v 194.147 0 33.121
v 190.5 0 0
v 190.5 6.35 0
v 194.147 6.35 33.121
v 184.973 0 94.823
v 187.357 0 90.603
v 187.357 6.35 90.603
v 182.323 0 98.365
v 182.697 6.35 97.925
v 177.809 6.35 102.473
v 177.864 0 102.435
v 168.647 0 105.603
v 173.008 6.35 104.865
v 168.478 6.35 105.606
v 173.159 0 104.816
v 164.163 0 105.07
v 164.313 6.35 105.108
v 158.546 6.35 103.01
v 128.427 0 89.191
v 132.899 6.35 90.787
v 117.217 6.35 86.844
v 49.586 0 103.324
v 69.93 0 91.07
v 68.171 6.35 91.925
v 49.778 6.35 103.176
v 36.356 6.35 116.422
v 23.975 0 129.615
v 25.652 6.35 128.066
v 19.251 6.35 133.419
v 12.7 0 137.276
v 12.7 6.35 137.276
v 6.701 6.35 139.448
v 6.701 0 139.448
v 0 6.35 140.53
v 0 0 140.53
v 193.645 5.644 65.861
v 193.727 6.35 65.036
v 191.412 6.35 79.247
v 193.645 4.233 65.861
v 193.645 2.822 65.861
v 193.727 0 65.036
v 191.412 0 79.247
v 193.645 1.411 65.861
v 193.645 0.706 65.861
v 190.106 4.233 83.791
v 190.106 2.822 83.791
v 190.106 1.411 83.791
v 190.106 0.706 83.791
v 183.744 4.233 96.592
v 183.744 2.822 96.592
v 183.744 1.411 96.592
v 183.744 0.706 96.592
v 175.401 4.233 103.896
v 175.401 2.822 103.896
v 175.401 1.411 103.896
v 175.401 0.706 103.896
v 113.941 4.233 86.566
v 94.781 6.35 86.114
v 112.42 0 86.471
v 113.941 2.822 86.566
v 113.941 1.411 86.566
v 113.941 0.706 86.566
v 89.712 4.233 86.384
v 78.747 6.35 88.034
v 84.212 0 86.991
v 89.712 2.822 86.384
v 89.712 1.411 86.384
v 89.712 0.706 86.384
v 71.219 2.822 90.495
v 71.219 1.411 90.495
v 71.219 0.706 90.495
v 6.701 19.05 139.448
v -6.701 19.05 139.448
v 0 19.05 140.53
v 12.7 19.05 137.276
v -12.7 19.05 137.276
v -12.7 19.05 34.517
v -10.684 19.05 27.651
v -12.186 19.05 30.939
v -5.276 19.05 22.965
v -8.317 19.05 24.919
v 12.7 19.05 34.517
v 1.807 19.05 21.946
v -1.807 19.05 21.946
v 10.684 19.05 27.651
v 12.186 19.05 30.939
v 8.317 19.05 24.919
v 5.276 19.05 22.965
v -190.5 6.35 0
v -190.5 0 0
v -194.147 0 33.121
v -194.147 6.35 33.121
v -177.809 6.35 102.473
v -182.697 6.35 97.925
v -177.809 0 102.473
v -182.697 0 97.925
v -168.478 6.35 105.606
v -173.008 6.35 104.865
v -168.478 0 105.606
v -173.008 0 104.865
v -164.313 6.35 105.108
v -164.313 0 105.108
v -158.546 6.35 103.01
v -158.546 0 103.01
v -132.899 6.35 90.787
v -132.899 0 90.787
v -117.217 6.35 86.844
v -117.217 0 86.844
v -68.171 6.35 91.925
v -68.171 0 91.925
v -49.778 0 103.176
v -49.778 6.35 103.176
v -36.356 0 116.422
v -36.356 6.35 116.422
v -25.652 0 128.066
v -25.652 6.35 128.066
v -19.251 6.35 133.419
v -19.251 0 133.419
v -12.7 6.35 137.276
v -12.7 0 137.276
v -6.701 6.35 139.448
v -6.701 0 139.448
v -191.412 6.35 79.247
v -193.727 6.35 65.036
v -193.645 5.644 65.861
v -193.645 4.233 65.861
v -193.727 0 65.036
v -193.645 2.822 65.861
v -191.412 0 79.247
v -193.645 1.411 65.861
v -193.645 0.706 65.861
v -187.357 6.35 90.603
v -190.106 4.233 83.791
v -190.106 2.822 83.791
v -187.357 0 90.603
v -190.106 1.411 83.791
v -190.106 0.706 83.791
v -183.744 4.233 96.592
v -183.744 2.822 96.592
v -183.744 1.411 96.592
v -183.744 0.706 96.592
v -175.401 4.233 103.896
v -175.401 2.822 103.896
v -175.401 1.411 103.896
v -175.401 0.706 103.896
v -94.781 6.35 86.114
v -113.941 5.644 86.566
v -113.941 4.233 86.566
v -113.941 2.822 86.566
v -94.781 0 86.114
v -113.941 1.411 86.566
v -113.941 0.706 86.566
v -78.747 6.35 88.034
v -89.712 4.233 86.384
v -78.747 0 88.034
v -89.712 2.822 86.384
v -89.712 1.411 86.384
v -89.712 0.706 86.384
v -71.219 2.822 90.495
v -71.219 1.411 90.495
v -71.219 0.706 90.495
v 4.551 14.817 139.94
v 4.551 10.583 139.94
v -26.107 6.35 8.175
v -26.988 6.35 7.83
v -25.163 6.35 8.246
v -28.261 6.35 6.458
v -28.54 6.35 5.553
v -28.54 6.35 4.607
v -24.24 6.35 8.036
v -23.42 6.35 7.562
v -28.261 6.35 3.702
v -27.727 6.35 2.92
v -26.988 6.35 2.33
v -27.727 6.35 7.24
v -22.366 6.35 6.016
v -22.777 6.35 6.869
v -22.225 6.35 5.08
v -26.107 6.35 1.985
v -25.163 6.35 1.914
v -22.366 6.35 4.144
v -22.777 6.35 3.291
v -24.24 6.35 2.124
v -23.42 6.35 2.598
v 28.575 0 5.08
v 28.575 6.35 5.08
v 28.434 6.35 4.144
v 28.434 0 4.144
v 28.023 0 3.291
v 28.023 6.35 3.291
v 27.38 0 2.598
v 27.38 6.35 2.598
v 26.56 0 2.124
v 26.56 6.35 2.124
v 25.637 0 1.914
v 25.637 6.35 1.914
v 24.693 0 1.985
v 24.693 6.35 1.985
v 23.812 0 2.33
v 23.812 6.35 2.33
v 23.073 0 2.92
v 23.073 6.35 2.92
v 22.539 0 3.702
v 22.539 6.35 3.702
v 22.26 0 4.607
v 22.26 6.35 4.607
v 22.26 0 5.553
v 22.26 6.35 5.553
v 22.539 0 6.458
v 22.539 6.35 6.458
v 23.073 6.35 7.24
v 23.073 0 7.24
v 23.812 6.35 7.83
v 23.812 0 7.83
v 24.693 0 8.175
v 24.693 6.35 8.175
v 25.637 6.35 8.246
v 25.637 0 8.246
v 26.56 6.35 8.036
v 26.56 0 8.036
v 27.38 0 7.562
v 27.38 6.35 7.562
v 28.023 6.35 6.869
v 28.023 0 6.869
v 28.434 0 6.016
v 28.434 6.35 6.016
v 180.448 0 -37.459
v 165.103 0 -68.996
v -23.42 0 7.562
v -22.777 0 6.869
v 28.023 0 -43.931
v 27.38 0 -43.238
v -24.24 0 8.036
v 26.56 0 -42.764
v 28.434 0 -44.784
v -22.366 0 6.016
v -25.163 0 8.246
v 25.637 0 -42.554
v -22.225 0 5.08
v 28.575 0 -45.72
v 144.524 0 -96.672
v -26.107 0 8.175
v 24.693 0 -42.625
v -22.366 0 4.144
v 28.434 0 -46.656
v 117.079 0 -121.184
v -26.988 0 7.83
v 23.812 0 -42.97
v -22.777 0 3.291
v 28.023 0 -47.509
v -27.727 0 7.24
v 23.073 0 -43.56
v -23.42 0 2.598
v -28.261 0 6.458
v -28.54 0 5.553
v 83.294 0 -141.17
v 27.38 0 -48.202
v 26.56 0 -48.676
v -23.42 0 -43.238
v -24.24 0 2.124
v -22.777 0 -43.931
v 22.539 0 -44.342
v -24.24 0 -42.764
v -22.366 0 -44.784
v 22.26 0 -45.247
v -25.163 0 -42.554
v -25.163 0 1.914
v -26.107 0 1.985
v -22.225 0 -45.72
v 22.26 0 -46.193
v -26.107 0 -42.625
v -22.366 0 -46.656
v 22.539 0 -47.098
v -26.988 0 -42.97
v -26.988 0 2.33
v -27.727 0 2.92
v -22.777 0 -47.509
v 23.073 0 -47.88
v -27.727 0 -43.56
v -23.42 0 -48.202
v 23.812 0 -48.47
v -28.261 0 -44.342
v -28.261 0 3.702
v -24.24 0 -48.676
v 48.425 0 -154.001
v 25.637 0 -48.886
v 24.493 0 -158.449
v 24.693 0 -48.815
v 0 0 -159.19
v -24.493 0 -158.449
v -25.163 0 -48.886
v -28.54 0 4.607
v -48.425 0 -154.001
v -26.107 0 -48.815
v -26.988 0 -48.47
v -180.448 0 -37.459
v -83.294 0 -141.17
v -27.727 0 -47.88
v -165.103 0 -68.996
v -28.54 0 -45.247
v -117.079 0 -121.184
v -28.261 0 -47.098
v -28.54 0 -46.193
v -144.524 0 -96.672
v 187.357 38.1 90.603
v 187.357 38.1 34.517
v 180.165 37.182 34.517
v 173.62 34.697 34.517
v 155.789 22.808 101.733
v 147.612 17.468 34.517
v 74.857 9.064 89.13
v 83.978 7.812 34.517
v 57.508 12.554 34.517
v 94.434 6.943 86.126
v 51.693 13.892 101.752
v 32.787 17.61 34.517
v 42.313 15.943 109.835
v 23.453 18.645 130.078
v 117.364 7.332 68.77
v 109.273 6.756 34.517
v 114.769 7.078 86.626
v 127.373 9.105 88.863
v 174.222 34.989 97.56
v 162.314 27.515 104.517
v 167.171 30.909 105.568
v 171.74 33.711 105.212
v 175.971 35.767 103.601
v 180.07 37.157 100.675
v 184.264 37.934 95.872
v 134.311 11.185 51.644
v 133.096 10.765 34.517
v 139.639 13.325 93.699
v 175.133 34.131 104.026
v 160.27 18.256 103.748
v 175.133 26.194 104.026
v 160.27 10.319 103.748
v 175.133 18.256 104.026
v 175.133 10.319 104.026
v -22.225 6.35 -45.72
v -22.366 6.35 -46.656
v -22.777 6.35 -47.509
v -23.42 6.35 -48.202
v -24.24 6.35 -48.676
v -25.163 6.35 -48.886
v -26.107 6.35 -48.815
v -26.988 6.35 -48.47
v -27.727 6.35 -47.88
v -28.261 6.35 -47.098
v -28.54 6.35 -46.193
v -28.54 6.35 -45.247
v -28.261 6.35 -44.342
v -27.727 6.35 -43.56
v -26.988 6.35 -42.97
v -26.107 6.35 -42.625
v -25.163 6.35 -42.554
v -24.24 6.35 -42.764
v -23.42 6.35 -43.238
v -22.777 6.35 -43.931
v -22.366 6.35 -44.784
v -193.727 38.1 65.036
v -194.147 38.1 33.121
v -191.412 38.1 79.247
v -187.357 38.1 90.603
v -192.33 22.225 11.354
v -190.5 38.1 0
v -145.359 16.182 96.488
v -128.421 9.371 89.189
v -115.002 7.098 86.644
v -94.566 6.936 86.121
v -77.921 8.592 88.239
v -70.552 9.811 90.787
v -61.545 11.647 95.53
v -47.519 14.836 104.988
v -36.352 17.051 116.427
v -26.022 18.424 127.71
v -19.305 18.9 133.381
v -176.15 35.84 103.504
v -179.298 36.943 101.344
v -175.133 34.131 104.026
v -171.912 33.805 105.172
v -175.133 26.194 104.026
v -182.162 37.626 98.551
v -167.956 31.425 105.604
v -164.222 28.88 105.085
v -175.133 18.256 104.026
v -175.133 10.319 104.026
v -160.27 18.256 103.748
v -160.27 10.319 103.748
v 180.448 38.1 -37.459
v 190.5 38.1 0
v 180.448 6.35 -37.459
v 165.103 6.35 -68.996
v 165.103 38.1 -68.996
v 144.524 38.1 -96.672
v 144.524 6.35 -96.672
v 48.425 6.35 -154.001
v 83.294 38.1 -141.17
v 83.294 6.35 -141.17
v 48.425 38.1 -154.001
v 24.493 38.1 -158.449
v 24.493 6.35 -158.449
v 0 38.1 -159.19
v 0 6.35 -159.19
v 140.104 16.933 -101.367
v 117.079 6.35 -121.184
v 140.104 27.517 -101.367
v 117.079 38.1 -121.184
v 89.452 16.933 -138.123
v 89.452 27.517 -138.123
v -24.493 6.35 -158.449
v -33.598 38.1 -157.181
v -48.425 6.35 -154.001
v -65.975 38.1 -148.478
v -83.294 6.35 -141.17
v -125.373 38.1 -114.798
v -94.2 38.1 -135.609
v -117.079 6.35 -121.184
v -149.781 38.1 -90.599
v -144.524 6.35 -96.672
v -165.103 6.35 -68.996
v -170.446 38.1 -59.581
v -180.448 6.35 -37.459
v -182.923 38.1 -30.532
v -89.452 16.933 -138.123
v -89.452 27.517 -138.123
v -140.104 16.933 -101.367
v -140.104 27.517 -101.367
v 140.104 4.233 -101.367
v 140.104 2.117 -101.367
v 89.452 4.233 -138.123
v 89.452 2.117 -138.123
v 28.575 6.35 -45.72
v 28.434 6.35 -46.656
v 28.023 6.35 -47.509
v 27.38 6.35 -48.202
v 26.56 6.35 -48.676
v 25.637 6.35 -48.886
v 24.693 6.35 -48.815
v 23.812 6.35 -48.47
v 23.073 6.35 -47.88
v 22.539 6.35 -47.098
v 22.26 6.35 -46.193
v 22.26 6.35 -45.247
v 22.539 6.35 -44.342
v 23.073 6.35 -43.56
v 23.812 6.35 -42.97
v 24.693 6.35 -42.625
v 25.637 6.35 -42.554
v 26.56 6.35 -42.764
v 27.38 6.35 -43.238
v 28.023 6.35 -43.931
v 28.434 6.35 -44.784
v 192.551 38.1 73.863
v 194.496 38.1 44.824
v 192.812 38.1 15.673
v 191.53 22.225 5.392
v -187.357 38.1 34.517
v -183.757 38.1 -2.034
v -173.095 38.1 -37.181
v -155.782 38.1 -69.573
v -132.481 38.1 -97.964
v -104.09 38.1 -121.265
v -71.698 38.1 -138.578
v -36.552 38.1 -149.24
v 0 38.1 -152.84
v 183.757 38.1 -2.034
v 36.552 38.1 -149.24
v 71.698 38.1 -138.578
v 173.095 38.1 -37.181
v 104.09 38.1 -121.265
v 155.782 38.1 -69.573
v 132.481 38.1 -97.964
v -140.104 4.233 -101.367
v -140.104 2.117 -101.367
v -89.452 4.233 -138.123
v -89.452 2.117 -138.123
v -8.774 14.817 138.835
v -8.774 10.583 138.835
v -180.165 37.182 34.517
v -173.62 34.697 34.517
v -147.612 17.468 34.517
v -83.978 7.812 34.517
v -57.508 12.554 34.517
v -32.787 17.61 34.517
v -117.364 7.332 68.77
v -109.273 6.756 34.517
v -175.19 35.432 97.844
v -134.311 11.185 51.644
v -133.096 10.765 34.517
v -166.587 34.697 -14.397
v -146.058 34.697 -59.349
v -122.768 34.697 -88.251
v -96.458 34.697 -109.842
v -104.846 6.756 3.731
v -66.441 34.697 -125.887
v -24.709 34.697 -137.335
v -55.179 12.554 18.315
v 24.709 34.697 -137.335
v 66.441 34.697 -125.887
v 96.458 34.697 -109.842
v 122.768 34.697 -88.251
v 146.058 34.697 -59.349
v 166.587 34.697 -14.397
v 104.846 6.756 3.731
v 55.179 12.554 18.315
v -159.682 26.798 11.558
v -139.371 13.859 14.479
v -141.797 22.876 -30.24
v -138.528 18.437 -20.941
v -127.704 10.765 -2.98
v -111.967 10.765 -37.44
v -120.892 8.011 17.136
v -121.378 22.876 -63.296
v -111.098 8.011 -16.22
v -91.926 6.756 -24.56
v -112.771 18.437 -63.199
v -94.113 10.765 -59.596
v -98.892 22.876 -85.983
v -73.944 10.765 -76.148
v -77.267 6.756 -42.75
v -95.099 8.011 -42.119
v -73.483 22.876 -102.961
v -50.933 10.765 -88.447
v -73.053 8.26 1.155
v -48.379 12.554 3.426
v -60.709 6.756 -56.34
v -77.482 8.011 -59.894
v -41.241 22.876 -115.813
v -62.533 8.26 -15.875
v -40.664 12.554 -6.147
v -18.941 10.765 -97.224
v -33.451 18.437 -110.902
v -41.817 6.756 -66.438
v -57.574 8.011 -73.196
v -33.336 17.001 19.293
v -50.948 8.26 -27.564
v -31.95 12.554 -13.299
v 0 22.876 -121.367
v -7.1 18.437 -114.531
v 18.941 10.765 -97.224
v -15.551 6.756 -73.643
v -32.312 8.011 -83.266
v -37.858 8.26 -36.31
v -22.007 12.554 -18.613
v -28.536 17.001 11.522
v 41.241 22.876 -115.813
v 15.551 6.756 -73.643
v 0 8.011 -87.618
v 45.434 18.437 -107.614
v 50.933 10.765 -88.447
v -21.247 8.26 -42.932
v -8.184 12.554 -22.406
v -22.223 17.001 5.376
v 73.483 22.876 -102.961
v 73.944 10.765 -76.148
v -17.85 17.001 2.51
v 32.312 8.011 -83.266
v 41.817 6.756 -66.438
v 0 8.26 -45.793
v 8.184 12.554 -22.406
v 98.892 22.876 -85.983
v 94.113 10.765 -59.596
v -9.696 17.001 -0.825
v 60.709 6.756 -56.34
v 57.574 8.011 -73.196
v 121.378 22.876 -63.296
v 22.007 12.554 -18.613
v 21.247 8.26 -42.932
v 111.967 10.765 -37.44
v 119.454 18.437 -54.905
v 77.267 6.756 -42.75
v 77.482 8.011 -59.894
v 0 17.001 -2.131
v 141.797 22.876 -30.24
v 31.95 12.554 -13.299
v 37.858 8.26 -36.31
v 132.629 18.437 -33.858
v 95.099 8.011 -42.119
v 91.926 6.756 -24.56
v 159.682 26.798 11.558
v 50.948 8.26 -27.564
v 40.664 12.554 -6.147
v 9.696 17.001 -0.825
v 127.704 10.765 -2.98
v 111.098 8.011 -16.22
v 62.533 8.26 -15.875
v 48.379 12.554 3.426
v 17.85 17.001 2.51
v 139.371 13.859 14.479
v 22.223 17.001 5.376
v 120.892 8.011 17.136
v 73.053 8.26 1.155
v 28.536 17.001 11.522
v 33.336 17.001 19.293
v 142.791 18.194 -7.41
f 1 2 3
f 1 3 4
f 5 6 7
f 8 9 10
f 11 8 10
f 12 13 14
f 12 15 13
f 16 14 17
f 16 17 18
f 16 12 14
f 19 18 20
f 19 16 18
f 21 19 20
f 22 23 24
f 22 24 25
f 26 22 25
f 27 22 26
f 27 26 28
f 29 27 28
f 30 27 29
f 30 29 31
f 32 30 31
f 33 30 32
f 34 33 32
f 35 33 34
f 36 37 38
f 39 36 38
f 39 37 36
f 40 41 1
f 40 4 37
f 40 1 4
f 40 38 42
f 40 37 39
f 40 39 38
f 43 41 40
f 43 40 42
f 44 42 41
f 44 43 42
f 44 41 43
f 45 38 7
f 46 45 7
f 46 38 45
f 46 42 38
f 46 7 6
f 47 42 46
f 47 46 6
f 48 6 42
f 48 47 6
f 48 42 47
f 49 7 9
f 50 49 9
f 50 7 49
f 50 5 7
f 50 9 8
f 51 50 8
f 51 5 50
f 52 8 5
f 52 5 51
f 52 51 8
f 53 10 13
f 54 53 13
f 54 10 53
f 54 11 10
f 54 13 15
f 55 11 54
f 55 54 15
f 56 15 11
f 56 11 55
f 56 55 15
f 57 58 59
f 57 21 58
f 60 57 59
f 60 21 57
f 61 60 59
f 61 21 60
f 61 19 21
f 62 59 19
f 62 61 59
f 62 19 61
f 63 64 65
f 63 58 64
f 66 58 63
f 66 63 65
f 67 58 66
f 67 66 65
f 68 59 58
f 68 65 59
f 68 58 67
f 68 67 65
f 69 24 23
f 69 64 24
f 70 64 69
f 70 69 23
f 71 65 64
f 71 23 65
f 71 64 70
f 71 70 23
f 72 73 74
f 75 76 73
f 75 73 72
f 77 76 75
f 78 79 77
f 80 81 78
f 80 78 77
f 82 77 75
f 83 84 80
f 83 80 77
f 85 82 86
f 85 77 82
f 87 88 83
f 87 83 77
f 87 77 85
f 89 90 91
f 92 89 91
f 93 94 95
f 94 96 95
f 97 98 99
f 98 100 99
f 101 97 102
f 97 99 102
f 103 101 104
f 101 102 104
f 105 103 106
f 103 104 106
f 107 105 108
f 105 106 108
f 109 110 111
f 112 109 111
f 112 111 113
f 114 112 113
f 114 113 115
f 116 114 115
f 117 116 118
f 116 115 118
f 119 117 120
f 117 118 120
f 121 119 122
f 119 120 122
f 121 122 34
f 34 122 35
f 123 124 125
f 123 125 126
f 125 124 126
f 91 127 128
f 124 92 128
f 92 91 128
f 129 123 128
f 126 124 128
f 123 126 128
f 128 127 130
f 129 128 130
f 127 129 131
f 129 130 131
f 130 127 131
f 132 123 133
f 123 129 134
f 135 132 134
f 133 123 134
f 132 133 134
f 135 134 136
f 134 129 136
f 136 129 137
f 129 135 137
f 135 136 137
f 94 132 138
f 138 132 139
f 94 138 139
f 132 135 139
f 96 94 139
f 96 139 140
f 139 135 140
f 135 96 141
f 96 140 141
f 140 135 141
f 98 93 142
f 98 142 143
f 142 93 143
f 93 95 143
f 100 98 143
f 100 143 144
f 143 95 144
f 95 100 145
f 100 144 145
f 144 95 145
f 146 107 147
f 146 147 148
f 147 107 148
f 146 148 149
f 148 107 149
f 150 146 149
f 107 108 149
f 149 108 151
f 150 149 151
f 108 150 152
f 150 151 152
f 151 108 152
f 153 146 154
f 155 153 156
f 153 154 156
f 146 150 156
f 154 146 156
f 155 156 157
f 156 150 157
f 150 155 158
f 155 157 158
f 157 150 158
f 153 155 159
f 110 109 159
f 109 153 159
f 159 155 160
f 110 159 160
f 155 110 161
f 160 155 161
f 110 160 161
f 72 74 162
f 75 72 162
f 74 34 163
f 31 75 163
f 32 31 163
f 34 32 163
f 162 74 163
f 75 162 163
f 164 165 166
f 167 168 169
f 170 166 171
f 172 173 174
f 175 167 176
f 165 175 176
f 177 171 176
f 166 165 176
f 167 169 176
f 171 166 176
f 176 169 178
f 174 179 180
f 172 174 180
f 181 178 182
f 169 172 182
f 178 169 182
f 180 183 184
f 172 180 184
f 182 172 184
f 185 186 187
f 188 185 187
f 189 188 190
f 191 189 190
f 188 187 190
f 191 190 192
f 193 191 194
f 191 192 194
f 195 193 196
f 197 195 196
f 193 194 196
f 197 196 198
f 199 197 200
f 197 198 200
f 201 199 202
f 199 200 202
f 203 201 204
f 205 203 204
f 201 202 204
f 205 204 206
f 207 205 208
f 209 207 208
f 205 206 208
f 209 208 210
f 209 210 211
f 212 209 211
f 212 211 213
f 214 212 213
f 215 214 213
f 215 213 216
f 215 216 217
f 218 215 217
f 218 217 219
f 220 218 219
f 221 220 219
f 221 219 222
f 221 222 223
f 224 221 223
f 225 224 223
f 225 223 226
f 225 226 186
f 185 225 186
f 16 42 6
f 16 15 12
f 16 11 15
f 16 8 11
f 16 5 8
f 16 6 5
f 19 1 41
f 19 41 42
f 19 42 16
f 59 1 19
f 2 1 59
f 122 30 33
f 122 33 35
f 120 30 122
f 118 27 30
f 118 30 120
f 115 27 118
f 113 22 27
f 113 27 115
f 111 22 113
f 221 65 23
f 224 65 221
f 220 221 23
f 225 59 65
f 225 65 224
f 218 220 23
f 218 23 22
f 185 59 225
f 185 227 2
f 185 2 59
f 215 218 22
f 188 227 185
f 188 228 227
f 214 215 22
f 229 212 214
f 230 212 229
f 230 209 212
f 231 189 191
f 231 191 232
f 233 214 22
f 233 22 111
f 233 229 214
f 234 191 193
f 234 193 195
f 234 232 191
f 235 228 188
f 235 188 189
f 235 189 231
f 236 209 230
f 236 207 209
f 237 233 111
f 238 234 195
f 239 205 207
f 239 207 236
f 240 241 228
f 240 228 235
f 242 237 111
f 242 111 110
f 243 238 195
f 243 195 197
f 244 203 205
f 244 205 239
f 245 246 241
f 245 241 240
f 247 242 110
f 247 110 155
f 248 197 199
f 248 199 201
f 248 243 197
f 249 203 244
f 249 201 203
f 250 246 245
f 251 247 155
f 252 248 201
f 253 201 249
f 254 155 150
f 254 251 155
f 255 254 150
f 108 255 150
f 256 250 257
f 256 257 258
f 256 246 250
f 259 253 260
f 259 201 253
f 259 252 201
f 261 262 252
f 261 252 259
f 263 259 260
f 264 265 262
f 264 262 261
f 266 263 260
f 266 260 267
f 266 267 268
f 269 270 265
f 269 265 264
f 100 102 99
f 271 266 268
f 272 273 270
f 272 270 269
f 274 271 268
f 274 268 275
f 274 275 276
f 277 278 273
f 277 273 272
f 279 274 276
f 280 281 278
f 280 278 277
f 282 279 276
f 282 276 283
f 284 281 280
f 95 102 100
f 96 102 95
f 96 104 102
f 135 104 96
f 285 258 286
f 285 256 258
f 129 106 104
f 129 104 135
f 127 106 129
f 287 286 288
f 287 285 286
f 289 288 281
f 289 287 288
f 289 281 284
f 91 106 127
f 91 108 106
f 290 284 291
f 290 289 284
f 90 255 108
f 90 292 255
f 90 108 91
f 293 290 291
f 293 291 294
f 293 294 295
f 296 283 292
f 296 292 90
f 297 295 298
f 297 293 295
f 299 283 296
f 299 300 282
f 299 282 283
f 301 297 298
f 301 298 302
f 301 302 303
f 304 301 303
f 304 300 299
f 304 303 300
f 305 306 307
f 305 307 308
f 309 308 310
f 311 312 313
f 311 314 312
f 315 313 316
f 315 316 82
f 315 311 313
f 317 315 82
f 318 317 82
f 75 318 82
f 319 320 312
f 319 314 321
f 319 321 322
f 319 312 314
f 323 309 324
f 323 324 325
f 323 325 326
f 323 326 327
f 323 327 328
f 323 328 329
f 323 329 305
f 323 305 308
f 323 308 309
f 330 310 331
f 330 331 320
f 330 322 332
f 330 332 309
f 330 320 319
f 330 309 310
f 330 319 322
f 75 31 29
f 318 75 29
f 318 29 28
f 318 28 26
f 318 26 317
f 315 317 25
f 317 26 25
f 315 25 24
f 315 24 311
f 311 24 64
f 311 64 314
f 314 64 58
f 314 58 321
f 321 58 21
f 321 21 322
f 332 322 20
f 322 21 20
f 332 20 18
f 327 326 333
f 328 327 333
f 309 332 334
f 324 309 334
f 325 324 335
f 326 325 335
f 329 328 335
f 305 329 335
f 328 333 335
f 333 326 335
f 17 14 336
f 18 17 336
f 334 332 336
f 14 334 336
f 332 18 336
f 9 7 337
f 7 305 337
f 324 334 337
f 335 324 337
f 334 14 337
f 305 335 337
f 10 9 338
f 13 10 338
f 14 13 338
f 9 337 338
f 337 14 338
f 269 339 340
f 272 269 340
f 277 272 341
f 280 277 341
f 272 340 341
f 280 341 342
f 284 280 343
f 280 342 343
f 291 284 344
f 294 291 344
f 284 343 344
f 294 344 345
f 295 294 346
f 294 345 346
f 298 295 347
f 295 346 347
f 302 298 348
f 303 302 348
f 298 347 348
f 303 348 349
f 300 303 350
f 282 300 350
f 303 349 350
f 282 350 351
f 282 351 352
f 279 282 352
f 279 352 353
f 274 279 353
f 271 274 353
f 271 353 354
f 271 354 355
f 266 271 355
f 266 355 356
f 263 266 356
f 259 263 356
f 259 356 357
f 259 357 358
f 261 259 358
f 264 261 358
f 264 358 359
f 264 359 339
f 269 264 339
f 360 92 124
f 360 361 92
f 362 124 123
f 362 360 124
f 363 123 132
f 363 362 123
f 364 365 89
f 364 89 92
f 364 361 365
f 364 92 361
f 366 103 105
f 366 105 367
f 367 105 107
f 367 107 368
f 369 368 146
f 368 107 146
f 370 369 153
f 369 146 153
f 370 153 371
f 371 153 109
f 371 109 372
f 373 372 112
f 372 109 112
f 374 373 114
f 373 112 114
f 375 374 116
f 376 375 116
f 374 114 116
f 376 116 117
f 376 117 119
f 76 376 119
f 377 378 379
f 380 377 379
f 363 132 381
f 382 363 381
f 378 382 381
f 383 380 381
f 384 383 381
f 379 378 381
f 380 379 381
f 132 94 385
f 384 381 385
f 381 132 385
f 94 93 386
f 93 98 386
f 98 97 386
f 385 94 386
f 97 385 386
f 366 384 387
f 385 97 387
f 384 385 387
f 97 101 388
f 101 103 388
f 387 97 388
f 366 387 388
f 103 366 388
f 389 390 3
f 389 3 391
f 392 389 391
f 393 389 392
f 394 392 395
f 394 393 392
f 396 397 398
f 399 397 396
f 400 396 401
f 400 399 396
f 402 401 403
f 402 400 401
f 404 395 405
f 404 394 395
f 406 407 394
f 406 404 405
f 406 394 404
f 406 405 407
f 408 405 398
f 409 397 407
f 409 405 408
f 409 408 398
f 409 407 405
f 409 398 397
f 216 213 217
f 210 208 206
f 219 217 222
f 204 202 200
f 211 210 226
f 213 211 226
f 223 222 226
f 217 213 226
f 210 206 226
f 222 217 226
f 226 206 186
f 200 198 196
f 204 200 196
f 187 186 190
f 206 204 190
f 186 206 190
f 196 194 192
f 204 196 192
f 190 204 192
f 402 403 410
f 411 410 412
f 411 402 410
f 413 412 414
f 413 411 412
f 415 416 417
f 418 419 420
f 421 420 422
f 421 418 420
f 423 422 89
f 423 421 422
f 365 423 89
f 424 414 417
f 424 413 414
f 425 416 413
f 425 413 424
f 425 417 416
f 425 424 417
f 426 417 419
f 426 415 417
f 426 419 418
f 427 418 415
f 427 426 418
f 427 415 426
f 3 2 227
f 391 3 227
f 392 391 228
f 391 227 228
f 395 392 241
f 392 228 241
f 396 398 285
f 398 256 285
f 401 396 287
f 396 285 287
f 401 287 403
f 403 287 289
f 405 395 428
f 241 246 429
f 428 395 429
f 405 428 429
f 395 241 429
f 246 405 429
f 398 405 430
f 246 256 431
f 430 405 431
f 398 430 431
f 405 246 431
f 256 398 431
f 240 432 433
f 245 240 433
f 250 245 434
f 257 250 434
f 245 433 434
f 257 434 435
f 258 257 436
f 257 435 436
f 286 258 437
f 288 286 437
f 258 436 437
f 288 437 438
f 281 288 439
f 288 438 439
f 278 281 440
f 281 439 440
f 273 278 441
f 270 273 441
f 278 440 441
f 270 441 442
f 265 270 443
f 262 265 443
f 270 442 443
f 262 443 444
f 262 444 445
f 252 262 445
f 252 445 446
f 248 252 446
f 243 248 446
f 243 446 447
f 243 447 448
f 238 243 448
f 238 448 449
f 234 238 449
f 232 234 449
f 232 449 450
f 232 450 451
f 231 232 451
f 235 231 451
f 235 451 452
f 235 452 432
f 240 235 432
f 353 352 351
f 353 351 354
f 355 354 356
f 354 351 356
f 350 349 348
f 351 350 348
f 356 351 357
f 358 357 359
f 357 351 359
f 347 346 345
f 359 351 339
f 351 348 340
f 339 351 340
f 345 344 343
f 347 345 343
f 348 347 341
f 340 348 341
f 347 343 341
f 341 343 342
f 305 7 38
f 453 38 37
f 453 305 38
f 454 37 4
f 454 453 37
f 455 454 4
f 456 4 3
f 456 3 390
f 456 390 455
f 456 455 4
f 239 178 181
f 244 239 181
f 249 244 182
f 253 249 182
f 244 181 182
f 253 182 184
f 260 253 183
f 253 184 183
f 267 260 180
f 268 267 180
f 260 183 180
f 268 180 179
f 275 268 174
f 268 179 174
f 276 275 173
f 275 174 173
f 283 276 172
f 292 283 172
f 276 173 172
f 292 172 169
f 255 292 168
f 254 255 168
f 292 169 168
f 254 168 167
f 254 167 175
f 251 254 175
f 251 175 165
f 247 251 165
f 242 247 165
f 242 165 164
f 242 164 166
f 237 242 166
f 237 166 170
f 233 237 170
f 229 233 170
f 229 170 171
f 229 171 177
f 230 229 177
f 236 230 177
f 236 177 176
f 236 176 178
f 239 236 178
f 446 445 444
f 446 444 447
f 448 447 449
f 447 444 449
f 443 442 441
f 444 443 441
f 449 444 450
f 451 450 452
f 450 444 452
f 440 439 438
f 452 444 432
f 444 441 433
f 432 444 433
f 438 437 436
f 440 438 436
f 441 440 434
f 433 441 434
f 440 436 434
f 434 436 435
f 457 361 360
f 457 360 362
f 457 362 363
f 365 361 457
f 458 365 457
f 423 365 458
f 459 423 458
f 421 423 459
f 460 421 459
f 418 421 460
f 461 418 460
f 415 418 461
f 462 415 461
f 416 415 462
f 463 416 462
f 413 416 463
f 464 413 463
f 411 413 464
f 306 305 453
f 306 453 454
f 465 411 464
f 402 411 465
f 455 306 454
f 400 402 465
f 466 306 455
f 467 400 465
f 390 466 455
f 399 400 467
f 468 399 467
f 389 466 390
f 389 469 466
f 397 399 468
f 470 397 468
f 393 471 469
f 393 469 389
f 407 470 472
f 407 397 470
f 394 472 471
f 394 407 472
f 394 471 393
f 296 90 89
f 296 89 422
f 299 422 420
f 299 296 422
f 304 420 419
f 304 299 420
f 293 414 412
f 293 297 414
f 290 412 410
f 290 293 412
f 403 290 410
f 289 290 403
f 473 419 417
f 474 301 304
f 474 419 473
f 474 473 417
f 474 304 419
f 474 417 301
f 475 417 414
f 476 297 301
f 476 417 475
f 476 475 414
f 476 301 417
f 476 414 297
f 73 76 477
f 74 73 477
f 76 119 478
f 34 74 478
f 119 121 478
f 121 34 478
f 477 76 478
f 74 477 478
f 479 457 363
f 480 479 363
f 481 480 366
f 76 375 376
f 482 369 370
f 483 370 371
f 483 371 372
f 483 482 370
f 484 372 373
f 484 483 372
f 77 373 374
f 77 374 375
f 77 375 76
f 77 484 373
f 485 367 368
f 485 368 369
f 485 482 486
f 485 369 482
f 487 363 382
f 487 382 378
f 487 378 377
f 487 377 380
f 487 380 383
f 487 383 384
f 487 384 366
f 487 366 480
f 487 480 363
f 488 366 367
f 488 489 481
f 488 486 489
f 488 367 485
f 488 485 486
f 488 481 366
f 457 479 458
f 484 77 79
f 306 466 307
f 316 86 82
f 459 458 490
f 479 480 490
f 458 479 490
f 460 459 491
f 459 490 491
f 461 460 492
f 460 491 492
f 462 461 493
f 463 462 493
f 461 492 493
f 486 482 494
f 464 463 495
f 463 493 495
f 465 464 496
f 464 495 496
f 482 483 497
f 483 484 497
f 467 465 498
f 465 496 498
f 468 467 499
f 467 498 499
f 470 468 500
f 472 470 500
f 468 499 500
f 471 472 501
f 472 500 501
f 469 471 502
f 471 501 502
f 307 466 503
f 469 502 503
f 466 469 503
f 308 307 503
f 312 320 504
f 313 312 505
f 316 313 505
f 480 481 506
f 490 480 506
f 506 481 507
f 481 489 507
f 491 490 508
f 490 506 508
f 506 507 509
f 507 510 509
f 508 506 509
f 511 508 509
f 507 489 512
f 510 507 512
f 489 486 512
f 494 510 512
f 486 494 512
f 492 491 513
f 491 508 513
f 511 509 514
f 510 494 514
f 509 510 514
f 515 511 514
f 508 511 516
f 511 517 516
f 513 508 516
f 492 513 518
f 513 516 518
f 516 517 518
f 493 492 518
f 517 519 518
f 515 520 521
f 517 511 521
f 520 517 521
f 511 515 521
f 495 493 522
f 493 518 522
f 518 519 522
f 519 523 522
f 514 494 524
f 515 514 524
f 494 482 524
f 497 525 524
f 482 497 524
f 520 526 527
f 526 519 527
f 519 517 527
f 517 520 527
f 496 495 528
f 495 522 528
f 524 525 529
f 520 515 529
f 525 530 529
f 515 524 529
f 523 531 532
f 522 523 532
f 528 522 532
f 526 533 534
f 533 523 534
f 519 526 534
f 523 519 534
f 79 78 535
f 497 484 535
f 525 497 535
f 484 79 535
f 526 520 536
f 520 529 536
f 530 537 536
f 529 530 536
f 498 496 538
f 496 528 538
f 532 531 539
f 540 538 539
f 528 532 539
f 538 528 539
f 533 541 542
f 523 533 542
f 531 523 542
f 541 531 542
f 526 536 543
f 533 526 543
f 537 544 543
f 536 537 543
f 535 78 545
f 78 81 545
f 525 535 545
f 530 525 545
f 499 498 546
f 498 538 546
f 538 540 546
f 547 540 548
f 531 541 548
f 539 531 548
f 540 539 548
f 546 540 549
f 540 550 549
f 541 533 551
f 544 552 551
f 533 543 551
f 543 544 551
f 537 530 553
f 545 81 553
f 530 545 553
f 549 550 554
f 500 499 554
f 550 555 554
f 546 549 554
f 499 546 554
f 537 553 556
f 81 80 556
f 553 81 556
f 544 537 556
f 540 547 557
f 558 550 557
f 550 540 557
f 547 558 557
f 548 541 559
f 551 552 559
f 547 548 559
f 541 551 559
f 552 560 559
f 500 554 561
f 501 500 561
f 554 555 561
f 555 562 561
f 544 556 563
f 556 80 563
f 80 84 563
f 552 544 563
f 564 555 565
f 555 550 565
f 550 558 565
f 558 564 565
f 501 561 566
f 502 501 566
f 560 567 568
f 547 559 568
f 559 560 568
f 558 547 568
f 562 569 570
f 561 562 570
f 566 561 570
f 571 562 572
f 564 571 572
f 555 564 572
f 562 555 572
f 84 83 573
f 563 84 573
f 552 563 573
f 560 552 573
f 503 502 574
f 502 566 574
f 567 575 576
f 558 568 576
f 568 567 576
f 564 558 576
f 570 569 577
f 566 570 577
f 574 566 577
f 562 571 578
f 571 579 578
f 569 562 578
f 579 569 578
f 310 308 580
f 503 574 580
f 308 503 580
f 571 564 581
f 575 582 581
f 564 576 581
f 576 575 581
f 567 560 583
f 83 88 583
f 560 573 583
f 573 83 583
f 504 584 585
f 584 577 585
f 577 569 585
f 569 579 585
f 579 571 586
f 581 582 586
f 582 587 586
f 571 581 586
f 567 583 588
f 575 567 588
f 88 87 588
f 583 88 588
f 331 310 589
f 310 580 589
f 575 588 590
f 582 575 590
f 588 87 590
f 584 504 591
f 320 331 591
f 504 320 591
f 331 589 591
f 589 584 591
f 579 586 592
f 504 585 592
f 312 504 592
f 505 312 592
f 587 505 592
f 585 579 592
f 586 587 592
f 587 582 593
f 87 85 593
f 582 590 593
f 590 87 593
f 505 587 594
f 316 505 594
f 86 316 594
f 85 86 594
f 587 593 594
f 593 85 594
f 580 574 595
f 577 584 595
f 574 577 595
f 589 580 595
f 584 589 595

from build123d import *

# Parameters (mm, degrees)
BOSS_EXTRUDE1_DEPTH         = 6.35
F_1_4_0_25_DIAMETER_HOLE1_D = 6.35
CUT_EXTRUDE3_DEPTH          = 257.844790723
BOSS_EXTRUDE2_START         = 31.75
BOSS_EXTRUDE2_DEPTH         = 31.75
BOSS_EXTRUDE3_DEPTH         = 12.7


with BuildPart() as part:
    # Sketch3 → Boss-Extrude1 (new body)
    with BuildSketch(Plane(origin=(0, 0, 0), x_dir=(1, 0, 0), z_dir=(0, 1, 0))):
        with BuildLine():
            add(Edge.make_bspline(
                [(-190.5, 0), (-184.392726562, 37.537038237), (-157.261289847, 93.964093485), (-82.387478202, 146.622658841), (-31.311374143, 160.799884185), (0, 159.189909928)],
                knots=[0, 0, 0, 0, 0.424401366, 0.656369581, 1, 1, 1, 1], degree=3))
            add(Edge.make_bspline(
                [(190.5, 0), (184.392726562, 37.537038237), (157.261289847, 93.964093485), (82.387478202, 146.622658841), (31.311374143, 160.799884185), (0, 159.189909928)],
                knots=[0, 0, 0, 0, 0.424401366, 0.656369581, 1, 1, 1, 1], degree=3))
            add(Edge.make_bspline(
                [(190.5, 0), (192.064011793, -4.963501926), (201.967167766, -83.314618311), (174.696602041, -109.289958804), (151.630121659, -100.567984898), (131.410771519, -87.719783961), (96.843567628, -85.375403377), (78.692510144, -86.25882742), (58.833533072, -96.87938247), (37.30593461, -109.935798162), (21.349613946, -139.114767457), (0, -140.530090072)],
                knots=[0, 0, 0, 0, 0.166997052, 0.292320514, 0.319633117, 0.42673531, 0.45891405, 0.609241775, 0.641909704, 0.76680237, 1, 1, 1, 1], degree=3))
            add(Edge.make_bspline(
                [(-190.5, 0), (-192.064011793, -4.963501926), (-201.967167766, -83.314618311), (-174.696602041, -109.289958804), (-151.630121659, -100.567984898), (-131.410771519, -87.719783961), (-96.843567628, -85.375403377), (-78.692510144, -86.25882742), (-58.833533072, -96.87938247), (-37.30593461, -109.935798162), (-21.349613946, -139.114767457), (0, -140.530090072)],
                knots=[0, 0, 0, 0, 0.166997052, 0.292320514, 0.319633117, 0.42673531, 0.45891405, 0.609241775, 0.641909704, 0.76680237, 1, 1, 1, 1], degree=3))
        make_face()
    extrude(amount=BOSS_EXTRUDE1_DEPTH)

    # 1/4 (0.25) Diameter Hole1 (through all)
    with Locations(Plane(origin=(0, 0, 0), x_dir=(-1, 0, 0), z_dir=(0, -1, 0))):
        with Locations((-25.4, 45.72), (25.4, 45.72), (25.4, -5.08), (-25.4, -5.08)):
            Hole(F_1_4_0_25_DIAMETER_HOLE1_D / 2)

    # Sweep3: sweep along a path in Sketch9
    with BuildLine(Plane(origin=(0, 6.35, 0), x_dir=(1, 0, 0), z_dir=(0, 1, 0))) as sweep3_path:
        Line((-187.357021454, -163.355137278), (-187.357021454, -34.517111526))
        ThreePointArc((-187.357021454, -34.517111526), (0, 152.839909928), (187.357021454, -34.517111526))
        Line((187.357021454, -34.517111526), (187.357021454, -159.794446851))
    # Sketch14 → Sweep3 (sweep)
    with BuildSketch(Plane.XY.offset(159.794446851)):
        with BuildLine():
            Line((187.357021454, 6.35), (187.357021454, 38.1))
            add(Edge.make_bspline(
                [(12.7, 19.05), (43.942, 19.05), (62.692965612, 6.892995609), (152.966881442, 6.044529769), (164.497021454, 38.1), (187.357021454, 38.1)],
                knots=[0, 0, 0, 0, 0.419037708, 0.519037708, 1, 1, 1, 1], degree=3))
            Line((12.7, 19.05), (12.7, 6.35))
            Line((12.7, 6.35), (187.357021454, 6.35))
        make_face()
    sweep(path=sweep3_path.line)

    # Sketch16 → Cut-Extrude3 (cut, through all)
    with BuildSketch(Plane.XZ):
        with BuildLine():
            Line((-187.357021454, 163.355137278), (-187.357021454, 90.603010601))
            add(Edge.make_bspline(
                [(-187.357021454, 90.603010601), (-182.022531897, 101.456727274), (-171.744921629, 108.173859638), (-151.630121659, 100.567984898), (-131.410771519, 87.719783961), (-96.843567628, 85.375403377), (-78.692510144, 86.25882742), (-58.833533072, 96.87938247), (-40.149019421, 108.211476835), (-26.027042678, 131.062023831), (-12.7, 137.276352827)],
                knots=[0.200234213, 0.200234213, 0.200234213, 0.200234213, 0.292320514, 0.319633117, 0.42673531, 0.45891405, 0.609241775, 0.641909704, 0.76680237, 0.948393743, 0.948393743, 0.948393743, 0.948393743], degree=3))
            Line((-12.7, 137.276352827), (-12.7, 163.355137278))
            Line((-12.7, 163.355137278), (-187.357021454, 163.355137278))
        make_face()
        with BuildLine():
            Line((12.7, 159.794446851), (12.7, 137.276352827))
            add(Edge.make_bspline(
                [(12.7, 137.276352827), (26.027042678, 131.062023831), (40.149019421, 108.211476835), (58.833533072, 96.87938247), (78.692510144, 86.25882742), (96.843567628, 85.375403377), (131.410771519, 87.719783961), (151.630121659, 100.567984898), (171.744921629, 108.173859638), (182.022531897, 101.456727274), (187.357021459, 90.603010604)],
                knots=[0.051606257, 0.051606257, 0.051606257, 0.051606257, 0.23319763, 0.358090296, 0.390758225, 0.54108595, 0.57326469, 0.680366883, 0.707679486, 0.799765787, 0.799765787, 0.799765787, 0.799765787], degree=3))
            Line((187.357021459, 90.603010604), (187.357021454, 159.794446851))
            Line((187.357021454, 159.794446851), (12.7, 159.794446851))
        make_face()
    extrude(amount=-CUT_EXTRUDE3_DEPTH, mode=Mode.SUBTRACT)

    # Sketch18 → Boss-Extrude2 (add)
    with BuildSketch(Plane(origin=(0, 6.35, 0), x_dir=(1, 0, 0), z_dir=(0, 1, 0)).offset(BOSS_EXTRUDE2_START)):
        with BuildLine():
            Line((-187.357021454, -90.603010614), (-187.357021454, -34.517111526))
            ThreePointArc((-187.357021454, -34.517111526), (0, 152.839909928), (187.357021454, -34.517111526))
            Line((187.357021454, -34.517111526), (187.357021459, -90.603010604))
            add(Edge.make_bspline(
                [(187.357021459, -90.603010604), (189.282425006, -86.68552528), (198.847492761, -58.632585631), (192.064011793, -4.963501926), (190.5, 0)],
                knots=[0.799765787, 0.799765787, 0.799765787, 0.799765787, 0.833002948, 1, 1, 1, 1], degree=3))
            add(Edge.make_bspline(
                [(190.5, 0), (184.392726562, 37.537038237), (157.261289847, 93.964093485), (82.387478202, 146.622658841), (31.311374143, 160.799884185), (0, 159.189909928)],
                knots=[0, 0, 0, 0, 0.424401366, 0.656369581, 1, 1, 1, 1], degree=3))
            add(Edge.make_bspline(
                [(0, 159.189909928), (-31.311374143, 160.799884185), (-82.387478202, 146.622658841), (-157.261289847, 93.964093485), (-184.392726562, 37.537038237), (-190.5, 0)],
                knots=[0, 0, 0, 0, 0.343630419, 0.575598634, 1, 1, 1, 1], degree=3))
            add(Edge.make_bspline(
                [(-190.5, 0), (-192.064011793, -4.963501926), (-198.847492762, -58.63258564), (-189.282425003, -86.685525289), (-187.357021454, -90.603010614)],
                knots=[0, 0, 0, 0, 0.166997052, 0.200234213, 0.200234213, 0.200234213, 0.200234213], degree=3))
        make_face()
    extrude(amount=-BOSS_EXTRUDE2_DEPTH)

    # Sketch20 → Boss-Extrude3 (add)
    with BuildSketch(Plane(origin=(0, 6.35, 0), x_dir=(1, 0, 0), z_dir=(0, 1, 0))):
        with BuildLine():
            Line((-12.7, -34.517111526), (-12.7, -137.276352827))
            add(Edge.make_bspline(
                [(-12.7, -137.276352827), (-8.912602093, -139.042396293), (-4.724634894, -140.216881476), (0, -140.530090072)],
                knots=[0.948393743, 0.948393743, 0.948393743, 0.948393743, 1, 1, 1, 1], degree=3))
            add(Edge.make_bspline(
                [(0, -140.530090072), (4.724634894, -140.216881476), (8.912602093, -139.042396293), (12.7, -137.276352827)],
                knots=[0, 0, 0, 0, 0.051606257, 0.051606257, 0.051606257, 0.051606257], degree=3))
            Line((12.7, -137.276352827), (12.7, -34.517111526))
            ThreePointArc((12.7, -34.517111526), (0, -21.817111526), (-12.7, -34.517111526))
        make_face()
    extrude(amount=BOSS_EXTRUDE3_DEPTH)


solid = part.part
